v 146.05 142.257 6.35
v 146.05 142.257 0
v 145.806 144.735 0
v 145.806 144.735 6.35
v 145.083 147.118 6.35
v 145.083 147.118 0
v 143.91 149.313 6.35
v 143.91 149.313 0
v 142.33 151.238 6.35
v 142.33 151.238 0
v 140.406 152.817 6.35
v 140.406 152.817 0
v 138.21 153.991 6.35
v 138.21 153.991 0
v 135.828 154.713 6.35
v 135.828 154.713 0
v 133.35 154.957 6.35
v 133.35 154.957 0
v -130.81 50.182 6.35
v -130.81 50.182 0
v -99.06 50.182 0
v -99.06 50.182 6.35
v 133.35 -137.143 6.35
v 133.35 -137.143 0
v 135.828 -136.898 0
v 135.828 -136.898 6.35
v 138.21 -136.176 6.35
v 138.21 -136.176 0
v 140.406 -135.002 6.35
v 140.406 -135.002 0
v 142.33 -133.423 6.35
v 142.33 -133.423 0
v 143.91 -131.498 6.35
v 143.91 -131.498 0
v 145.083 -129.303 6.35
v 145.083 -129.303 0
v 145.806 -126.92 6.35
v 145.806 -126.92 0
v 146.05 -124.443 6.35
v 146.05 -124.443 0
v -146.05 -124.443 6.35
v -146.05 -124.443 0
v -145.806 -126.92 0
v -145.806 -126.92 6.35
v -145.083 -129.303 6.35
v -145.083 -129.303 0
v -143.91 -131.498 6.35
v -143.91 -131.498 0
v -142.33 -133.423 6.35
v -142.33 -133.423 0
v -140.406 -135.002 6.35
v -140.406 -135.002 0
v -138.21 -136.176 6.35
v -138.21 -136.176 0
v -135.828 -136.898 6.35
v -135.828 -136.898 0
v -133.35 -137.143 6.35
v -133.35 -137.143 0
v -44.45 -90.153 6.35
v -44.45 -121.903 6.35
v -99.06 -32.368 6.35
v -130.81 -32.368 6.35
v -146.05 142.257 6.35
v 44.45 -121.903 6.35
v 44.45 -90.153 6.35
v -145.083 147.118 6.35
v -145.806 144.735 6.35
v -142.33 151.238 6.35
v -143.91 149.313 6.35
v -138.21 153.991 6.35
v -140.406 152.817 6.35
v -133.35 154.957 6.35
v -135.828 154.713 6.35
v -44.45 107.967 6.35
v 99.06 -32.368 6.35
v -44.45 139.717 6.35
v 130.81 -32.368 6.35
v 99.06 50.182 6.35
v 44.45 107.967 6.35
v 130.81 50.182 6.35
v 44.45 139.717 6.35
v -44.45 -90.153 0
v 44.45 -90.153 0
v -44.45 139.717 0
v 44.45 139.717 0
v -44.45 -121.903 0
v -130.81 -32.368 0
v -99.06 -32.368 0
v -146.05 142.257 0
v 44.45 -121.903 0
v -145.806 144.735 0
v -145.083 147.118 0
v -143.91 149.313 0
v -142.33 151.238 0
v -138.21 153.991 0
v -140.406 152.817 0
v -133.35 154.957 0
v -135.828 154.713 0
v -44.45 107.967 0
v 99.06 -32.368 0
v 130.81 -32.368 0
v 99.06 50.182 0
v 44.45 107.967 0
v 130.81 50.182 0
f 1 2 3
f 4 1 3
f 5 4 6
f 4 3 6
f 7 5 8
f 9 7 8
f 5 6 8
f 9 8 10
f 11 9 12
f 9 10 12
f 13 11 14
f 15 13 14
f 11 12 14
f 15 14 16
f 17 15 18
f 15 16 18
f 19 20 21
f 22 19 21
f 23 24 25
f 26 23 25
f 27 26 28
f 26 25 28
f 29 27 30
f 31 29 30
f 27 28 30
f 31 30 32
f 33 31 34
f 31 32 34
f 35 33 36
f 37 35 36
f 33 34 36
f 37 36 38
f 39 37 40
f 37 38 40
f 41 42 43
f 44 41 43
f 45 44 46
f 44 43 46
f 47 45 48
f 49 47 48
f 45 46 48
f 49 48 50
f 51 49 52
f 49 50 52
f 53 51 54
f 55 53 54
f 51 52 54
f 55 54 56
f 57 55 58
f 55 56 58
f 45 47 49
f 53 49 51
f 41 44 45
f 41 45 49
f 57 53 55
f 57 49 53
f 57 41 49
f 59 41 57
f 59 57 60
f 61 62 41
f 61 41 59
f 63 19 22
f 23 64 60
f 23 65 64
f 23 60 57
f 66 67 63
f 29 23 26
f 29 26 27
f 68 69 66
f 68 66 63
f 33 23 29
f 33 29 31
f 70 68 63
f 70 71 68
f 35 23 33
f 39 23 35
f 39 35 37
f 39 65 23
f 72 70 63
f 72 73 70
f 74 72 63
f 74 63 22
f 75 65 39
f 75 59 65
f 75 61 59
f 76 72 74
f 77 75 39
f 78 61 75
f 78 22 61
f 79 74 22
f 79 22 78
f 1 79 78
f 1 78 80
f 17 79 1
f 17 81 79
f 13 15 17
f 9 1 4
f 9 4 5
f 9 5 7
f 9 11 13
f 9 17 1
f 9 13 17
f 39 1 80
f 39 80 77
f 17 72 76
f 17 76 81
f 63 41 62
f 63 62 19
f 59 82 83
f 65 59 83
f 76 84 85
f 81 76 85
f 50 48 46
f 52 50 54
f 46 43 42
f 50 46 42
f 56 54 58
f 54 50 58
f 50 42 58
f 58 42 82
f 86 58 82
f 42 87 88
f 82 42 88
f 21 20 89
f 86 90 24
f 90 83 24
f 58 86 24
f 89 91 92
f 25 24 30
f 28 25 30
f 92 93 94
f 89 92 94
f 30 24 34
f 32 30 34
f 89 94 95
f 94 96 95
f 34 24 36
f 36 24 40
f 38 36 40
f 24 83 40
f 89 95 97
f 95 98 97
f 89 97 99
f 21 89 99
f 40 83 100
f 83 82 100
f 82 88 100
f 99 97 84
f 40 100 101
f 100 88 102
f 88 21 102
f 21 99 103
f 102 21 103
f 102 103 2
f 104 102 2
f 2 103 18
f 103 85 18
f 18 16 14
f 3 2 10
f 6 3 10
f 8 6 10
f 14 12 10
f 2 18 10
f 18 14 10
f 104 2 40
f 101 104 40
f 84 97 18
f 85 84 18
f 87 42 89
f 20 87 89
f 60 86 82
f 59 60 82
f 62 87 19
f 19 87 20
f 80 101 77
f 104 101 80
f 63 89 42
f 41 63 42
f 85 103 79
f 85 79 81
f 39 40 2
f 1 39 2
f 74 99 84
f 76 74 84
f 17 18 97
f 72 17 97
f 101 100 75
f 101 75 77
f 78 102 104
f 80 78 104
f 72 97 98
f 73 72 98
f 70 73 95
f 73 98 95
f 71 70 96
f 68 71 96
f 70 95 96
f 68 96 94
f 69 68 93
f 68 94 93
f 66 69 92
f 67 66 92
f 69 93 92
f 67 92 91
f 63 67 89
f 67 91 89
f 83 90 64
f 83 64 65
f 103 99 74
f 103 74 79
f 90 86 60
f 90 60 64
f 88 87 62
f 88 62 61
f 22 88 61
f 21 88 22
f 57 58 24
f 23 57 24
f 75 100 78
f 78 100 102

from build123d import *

# Parameters (mm, degrees)
F0_W     = 31.75
F0_H     = 82.55
F0_W_2   = 88.9
F0_H_2   = 31.75
F1_DEPTH = 6.35


with BuildPart() as f1:
    # F0 (on Top) → F1 (new body)
    with BuildSketch(Plane.XY):
        with BuildLine():
            ThreePointArc((-146.05, -124.442522), (-142.330256, -133.422778), (-133.35, -137.142522))
            Line((-133.35, -137.142522), (133.35, -137.142522))
            ThreePointArc((133.35, -137.142522), (142.330256, -133.422778), (146.05, -124.442522))
            Line((146.05, -124.442522), (146.05, 142.257478))
            ThreePointArc((146.05, 142.257478), (142.330256, 151.237734), (133.35, 154.957478))
            Line((133.35, 154.957478), (-133.35, 154.957478))
            ThreePointArc((-133.35, 154.957478), (-142.330256, 151.237734), (-146.05, 142.257478))
            Line((-146.05, 142.257478), (-146.05, -124.442522))
        make_face()
        with Locations((-114.935, 8.907478)):
            Rectangle(F0_W, F0_H, mode=Mode.SUBTRACT)
        with Locations((0, -106.027522)):
            Rectangle(F0_W_2, F0_H_2, mode=Mode.SUBTRACT)
        with Locations((114.935, 8.907478)):
            Rectangle(F0_W, F0_H, mode=Mode.SUBTRACT)
        with Locations((0, 123.842478)):
            Rectangle(F0_W_2, F0_H_2, mode=Mode.SUBTRACT)
    extrude(amount=F1_DEPTH)


solid = f1.part
